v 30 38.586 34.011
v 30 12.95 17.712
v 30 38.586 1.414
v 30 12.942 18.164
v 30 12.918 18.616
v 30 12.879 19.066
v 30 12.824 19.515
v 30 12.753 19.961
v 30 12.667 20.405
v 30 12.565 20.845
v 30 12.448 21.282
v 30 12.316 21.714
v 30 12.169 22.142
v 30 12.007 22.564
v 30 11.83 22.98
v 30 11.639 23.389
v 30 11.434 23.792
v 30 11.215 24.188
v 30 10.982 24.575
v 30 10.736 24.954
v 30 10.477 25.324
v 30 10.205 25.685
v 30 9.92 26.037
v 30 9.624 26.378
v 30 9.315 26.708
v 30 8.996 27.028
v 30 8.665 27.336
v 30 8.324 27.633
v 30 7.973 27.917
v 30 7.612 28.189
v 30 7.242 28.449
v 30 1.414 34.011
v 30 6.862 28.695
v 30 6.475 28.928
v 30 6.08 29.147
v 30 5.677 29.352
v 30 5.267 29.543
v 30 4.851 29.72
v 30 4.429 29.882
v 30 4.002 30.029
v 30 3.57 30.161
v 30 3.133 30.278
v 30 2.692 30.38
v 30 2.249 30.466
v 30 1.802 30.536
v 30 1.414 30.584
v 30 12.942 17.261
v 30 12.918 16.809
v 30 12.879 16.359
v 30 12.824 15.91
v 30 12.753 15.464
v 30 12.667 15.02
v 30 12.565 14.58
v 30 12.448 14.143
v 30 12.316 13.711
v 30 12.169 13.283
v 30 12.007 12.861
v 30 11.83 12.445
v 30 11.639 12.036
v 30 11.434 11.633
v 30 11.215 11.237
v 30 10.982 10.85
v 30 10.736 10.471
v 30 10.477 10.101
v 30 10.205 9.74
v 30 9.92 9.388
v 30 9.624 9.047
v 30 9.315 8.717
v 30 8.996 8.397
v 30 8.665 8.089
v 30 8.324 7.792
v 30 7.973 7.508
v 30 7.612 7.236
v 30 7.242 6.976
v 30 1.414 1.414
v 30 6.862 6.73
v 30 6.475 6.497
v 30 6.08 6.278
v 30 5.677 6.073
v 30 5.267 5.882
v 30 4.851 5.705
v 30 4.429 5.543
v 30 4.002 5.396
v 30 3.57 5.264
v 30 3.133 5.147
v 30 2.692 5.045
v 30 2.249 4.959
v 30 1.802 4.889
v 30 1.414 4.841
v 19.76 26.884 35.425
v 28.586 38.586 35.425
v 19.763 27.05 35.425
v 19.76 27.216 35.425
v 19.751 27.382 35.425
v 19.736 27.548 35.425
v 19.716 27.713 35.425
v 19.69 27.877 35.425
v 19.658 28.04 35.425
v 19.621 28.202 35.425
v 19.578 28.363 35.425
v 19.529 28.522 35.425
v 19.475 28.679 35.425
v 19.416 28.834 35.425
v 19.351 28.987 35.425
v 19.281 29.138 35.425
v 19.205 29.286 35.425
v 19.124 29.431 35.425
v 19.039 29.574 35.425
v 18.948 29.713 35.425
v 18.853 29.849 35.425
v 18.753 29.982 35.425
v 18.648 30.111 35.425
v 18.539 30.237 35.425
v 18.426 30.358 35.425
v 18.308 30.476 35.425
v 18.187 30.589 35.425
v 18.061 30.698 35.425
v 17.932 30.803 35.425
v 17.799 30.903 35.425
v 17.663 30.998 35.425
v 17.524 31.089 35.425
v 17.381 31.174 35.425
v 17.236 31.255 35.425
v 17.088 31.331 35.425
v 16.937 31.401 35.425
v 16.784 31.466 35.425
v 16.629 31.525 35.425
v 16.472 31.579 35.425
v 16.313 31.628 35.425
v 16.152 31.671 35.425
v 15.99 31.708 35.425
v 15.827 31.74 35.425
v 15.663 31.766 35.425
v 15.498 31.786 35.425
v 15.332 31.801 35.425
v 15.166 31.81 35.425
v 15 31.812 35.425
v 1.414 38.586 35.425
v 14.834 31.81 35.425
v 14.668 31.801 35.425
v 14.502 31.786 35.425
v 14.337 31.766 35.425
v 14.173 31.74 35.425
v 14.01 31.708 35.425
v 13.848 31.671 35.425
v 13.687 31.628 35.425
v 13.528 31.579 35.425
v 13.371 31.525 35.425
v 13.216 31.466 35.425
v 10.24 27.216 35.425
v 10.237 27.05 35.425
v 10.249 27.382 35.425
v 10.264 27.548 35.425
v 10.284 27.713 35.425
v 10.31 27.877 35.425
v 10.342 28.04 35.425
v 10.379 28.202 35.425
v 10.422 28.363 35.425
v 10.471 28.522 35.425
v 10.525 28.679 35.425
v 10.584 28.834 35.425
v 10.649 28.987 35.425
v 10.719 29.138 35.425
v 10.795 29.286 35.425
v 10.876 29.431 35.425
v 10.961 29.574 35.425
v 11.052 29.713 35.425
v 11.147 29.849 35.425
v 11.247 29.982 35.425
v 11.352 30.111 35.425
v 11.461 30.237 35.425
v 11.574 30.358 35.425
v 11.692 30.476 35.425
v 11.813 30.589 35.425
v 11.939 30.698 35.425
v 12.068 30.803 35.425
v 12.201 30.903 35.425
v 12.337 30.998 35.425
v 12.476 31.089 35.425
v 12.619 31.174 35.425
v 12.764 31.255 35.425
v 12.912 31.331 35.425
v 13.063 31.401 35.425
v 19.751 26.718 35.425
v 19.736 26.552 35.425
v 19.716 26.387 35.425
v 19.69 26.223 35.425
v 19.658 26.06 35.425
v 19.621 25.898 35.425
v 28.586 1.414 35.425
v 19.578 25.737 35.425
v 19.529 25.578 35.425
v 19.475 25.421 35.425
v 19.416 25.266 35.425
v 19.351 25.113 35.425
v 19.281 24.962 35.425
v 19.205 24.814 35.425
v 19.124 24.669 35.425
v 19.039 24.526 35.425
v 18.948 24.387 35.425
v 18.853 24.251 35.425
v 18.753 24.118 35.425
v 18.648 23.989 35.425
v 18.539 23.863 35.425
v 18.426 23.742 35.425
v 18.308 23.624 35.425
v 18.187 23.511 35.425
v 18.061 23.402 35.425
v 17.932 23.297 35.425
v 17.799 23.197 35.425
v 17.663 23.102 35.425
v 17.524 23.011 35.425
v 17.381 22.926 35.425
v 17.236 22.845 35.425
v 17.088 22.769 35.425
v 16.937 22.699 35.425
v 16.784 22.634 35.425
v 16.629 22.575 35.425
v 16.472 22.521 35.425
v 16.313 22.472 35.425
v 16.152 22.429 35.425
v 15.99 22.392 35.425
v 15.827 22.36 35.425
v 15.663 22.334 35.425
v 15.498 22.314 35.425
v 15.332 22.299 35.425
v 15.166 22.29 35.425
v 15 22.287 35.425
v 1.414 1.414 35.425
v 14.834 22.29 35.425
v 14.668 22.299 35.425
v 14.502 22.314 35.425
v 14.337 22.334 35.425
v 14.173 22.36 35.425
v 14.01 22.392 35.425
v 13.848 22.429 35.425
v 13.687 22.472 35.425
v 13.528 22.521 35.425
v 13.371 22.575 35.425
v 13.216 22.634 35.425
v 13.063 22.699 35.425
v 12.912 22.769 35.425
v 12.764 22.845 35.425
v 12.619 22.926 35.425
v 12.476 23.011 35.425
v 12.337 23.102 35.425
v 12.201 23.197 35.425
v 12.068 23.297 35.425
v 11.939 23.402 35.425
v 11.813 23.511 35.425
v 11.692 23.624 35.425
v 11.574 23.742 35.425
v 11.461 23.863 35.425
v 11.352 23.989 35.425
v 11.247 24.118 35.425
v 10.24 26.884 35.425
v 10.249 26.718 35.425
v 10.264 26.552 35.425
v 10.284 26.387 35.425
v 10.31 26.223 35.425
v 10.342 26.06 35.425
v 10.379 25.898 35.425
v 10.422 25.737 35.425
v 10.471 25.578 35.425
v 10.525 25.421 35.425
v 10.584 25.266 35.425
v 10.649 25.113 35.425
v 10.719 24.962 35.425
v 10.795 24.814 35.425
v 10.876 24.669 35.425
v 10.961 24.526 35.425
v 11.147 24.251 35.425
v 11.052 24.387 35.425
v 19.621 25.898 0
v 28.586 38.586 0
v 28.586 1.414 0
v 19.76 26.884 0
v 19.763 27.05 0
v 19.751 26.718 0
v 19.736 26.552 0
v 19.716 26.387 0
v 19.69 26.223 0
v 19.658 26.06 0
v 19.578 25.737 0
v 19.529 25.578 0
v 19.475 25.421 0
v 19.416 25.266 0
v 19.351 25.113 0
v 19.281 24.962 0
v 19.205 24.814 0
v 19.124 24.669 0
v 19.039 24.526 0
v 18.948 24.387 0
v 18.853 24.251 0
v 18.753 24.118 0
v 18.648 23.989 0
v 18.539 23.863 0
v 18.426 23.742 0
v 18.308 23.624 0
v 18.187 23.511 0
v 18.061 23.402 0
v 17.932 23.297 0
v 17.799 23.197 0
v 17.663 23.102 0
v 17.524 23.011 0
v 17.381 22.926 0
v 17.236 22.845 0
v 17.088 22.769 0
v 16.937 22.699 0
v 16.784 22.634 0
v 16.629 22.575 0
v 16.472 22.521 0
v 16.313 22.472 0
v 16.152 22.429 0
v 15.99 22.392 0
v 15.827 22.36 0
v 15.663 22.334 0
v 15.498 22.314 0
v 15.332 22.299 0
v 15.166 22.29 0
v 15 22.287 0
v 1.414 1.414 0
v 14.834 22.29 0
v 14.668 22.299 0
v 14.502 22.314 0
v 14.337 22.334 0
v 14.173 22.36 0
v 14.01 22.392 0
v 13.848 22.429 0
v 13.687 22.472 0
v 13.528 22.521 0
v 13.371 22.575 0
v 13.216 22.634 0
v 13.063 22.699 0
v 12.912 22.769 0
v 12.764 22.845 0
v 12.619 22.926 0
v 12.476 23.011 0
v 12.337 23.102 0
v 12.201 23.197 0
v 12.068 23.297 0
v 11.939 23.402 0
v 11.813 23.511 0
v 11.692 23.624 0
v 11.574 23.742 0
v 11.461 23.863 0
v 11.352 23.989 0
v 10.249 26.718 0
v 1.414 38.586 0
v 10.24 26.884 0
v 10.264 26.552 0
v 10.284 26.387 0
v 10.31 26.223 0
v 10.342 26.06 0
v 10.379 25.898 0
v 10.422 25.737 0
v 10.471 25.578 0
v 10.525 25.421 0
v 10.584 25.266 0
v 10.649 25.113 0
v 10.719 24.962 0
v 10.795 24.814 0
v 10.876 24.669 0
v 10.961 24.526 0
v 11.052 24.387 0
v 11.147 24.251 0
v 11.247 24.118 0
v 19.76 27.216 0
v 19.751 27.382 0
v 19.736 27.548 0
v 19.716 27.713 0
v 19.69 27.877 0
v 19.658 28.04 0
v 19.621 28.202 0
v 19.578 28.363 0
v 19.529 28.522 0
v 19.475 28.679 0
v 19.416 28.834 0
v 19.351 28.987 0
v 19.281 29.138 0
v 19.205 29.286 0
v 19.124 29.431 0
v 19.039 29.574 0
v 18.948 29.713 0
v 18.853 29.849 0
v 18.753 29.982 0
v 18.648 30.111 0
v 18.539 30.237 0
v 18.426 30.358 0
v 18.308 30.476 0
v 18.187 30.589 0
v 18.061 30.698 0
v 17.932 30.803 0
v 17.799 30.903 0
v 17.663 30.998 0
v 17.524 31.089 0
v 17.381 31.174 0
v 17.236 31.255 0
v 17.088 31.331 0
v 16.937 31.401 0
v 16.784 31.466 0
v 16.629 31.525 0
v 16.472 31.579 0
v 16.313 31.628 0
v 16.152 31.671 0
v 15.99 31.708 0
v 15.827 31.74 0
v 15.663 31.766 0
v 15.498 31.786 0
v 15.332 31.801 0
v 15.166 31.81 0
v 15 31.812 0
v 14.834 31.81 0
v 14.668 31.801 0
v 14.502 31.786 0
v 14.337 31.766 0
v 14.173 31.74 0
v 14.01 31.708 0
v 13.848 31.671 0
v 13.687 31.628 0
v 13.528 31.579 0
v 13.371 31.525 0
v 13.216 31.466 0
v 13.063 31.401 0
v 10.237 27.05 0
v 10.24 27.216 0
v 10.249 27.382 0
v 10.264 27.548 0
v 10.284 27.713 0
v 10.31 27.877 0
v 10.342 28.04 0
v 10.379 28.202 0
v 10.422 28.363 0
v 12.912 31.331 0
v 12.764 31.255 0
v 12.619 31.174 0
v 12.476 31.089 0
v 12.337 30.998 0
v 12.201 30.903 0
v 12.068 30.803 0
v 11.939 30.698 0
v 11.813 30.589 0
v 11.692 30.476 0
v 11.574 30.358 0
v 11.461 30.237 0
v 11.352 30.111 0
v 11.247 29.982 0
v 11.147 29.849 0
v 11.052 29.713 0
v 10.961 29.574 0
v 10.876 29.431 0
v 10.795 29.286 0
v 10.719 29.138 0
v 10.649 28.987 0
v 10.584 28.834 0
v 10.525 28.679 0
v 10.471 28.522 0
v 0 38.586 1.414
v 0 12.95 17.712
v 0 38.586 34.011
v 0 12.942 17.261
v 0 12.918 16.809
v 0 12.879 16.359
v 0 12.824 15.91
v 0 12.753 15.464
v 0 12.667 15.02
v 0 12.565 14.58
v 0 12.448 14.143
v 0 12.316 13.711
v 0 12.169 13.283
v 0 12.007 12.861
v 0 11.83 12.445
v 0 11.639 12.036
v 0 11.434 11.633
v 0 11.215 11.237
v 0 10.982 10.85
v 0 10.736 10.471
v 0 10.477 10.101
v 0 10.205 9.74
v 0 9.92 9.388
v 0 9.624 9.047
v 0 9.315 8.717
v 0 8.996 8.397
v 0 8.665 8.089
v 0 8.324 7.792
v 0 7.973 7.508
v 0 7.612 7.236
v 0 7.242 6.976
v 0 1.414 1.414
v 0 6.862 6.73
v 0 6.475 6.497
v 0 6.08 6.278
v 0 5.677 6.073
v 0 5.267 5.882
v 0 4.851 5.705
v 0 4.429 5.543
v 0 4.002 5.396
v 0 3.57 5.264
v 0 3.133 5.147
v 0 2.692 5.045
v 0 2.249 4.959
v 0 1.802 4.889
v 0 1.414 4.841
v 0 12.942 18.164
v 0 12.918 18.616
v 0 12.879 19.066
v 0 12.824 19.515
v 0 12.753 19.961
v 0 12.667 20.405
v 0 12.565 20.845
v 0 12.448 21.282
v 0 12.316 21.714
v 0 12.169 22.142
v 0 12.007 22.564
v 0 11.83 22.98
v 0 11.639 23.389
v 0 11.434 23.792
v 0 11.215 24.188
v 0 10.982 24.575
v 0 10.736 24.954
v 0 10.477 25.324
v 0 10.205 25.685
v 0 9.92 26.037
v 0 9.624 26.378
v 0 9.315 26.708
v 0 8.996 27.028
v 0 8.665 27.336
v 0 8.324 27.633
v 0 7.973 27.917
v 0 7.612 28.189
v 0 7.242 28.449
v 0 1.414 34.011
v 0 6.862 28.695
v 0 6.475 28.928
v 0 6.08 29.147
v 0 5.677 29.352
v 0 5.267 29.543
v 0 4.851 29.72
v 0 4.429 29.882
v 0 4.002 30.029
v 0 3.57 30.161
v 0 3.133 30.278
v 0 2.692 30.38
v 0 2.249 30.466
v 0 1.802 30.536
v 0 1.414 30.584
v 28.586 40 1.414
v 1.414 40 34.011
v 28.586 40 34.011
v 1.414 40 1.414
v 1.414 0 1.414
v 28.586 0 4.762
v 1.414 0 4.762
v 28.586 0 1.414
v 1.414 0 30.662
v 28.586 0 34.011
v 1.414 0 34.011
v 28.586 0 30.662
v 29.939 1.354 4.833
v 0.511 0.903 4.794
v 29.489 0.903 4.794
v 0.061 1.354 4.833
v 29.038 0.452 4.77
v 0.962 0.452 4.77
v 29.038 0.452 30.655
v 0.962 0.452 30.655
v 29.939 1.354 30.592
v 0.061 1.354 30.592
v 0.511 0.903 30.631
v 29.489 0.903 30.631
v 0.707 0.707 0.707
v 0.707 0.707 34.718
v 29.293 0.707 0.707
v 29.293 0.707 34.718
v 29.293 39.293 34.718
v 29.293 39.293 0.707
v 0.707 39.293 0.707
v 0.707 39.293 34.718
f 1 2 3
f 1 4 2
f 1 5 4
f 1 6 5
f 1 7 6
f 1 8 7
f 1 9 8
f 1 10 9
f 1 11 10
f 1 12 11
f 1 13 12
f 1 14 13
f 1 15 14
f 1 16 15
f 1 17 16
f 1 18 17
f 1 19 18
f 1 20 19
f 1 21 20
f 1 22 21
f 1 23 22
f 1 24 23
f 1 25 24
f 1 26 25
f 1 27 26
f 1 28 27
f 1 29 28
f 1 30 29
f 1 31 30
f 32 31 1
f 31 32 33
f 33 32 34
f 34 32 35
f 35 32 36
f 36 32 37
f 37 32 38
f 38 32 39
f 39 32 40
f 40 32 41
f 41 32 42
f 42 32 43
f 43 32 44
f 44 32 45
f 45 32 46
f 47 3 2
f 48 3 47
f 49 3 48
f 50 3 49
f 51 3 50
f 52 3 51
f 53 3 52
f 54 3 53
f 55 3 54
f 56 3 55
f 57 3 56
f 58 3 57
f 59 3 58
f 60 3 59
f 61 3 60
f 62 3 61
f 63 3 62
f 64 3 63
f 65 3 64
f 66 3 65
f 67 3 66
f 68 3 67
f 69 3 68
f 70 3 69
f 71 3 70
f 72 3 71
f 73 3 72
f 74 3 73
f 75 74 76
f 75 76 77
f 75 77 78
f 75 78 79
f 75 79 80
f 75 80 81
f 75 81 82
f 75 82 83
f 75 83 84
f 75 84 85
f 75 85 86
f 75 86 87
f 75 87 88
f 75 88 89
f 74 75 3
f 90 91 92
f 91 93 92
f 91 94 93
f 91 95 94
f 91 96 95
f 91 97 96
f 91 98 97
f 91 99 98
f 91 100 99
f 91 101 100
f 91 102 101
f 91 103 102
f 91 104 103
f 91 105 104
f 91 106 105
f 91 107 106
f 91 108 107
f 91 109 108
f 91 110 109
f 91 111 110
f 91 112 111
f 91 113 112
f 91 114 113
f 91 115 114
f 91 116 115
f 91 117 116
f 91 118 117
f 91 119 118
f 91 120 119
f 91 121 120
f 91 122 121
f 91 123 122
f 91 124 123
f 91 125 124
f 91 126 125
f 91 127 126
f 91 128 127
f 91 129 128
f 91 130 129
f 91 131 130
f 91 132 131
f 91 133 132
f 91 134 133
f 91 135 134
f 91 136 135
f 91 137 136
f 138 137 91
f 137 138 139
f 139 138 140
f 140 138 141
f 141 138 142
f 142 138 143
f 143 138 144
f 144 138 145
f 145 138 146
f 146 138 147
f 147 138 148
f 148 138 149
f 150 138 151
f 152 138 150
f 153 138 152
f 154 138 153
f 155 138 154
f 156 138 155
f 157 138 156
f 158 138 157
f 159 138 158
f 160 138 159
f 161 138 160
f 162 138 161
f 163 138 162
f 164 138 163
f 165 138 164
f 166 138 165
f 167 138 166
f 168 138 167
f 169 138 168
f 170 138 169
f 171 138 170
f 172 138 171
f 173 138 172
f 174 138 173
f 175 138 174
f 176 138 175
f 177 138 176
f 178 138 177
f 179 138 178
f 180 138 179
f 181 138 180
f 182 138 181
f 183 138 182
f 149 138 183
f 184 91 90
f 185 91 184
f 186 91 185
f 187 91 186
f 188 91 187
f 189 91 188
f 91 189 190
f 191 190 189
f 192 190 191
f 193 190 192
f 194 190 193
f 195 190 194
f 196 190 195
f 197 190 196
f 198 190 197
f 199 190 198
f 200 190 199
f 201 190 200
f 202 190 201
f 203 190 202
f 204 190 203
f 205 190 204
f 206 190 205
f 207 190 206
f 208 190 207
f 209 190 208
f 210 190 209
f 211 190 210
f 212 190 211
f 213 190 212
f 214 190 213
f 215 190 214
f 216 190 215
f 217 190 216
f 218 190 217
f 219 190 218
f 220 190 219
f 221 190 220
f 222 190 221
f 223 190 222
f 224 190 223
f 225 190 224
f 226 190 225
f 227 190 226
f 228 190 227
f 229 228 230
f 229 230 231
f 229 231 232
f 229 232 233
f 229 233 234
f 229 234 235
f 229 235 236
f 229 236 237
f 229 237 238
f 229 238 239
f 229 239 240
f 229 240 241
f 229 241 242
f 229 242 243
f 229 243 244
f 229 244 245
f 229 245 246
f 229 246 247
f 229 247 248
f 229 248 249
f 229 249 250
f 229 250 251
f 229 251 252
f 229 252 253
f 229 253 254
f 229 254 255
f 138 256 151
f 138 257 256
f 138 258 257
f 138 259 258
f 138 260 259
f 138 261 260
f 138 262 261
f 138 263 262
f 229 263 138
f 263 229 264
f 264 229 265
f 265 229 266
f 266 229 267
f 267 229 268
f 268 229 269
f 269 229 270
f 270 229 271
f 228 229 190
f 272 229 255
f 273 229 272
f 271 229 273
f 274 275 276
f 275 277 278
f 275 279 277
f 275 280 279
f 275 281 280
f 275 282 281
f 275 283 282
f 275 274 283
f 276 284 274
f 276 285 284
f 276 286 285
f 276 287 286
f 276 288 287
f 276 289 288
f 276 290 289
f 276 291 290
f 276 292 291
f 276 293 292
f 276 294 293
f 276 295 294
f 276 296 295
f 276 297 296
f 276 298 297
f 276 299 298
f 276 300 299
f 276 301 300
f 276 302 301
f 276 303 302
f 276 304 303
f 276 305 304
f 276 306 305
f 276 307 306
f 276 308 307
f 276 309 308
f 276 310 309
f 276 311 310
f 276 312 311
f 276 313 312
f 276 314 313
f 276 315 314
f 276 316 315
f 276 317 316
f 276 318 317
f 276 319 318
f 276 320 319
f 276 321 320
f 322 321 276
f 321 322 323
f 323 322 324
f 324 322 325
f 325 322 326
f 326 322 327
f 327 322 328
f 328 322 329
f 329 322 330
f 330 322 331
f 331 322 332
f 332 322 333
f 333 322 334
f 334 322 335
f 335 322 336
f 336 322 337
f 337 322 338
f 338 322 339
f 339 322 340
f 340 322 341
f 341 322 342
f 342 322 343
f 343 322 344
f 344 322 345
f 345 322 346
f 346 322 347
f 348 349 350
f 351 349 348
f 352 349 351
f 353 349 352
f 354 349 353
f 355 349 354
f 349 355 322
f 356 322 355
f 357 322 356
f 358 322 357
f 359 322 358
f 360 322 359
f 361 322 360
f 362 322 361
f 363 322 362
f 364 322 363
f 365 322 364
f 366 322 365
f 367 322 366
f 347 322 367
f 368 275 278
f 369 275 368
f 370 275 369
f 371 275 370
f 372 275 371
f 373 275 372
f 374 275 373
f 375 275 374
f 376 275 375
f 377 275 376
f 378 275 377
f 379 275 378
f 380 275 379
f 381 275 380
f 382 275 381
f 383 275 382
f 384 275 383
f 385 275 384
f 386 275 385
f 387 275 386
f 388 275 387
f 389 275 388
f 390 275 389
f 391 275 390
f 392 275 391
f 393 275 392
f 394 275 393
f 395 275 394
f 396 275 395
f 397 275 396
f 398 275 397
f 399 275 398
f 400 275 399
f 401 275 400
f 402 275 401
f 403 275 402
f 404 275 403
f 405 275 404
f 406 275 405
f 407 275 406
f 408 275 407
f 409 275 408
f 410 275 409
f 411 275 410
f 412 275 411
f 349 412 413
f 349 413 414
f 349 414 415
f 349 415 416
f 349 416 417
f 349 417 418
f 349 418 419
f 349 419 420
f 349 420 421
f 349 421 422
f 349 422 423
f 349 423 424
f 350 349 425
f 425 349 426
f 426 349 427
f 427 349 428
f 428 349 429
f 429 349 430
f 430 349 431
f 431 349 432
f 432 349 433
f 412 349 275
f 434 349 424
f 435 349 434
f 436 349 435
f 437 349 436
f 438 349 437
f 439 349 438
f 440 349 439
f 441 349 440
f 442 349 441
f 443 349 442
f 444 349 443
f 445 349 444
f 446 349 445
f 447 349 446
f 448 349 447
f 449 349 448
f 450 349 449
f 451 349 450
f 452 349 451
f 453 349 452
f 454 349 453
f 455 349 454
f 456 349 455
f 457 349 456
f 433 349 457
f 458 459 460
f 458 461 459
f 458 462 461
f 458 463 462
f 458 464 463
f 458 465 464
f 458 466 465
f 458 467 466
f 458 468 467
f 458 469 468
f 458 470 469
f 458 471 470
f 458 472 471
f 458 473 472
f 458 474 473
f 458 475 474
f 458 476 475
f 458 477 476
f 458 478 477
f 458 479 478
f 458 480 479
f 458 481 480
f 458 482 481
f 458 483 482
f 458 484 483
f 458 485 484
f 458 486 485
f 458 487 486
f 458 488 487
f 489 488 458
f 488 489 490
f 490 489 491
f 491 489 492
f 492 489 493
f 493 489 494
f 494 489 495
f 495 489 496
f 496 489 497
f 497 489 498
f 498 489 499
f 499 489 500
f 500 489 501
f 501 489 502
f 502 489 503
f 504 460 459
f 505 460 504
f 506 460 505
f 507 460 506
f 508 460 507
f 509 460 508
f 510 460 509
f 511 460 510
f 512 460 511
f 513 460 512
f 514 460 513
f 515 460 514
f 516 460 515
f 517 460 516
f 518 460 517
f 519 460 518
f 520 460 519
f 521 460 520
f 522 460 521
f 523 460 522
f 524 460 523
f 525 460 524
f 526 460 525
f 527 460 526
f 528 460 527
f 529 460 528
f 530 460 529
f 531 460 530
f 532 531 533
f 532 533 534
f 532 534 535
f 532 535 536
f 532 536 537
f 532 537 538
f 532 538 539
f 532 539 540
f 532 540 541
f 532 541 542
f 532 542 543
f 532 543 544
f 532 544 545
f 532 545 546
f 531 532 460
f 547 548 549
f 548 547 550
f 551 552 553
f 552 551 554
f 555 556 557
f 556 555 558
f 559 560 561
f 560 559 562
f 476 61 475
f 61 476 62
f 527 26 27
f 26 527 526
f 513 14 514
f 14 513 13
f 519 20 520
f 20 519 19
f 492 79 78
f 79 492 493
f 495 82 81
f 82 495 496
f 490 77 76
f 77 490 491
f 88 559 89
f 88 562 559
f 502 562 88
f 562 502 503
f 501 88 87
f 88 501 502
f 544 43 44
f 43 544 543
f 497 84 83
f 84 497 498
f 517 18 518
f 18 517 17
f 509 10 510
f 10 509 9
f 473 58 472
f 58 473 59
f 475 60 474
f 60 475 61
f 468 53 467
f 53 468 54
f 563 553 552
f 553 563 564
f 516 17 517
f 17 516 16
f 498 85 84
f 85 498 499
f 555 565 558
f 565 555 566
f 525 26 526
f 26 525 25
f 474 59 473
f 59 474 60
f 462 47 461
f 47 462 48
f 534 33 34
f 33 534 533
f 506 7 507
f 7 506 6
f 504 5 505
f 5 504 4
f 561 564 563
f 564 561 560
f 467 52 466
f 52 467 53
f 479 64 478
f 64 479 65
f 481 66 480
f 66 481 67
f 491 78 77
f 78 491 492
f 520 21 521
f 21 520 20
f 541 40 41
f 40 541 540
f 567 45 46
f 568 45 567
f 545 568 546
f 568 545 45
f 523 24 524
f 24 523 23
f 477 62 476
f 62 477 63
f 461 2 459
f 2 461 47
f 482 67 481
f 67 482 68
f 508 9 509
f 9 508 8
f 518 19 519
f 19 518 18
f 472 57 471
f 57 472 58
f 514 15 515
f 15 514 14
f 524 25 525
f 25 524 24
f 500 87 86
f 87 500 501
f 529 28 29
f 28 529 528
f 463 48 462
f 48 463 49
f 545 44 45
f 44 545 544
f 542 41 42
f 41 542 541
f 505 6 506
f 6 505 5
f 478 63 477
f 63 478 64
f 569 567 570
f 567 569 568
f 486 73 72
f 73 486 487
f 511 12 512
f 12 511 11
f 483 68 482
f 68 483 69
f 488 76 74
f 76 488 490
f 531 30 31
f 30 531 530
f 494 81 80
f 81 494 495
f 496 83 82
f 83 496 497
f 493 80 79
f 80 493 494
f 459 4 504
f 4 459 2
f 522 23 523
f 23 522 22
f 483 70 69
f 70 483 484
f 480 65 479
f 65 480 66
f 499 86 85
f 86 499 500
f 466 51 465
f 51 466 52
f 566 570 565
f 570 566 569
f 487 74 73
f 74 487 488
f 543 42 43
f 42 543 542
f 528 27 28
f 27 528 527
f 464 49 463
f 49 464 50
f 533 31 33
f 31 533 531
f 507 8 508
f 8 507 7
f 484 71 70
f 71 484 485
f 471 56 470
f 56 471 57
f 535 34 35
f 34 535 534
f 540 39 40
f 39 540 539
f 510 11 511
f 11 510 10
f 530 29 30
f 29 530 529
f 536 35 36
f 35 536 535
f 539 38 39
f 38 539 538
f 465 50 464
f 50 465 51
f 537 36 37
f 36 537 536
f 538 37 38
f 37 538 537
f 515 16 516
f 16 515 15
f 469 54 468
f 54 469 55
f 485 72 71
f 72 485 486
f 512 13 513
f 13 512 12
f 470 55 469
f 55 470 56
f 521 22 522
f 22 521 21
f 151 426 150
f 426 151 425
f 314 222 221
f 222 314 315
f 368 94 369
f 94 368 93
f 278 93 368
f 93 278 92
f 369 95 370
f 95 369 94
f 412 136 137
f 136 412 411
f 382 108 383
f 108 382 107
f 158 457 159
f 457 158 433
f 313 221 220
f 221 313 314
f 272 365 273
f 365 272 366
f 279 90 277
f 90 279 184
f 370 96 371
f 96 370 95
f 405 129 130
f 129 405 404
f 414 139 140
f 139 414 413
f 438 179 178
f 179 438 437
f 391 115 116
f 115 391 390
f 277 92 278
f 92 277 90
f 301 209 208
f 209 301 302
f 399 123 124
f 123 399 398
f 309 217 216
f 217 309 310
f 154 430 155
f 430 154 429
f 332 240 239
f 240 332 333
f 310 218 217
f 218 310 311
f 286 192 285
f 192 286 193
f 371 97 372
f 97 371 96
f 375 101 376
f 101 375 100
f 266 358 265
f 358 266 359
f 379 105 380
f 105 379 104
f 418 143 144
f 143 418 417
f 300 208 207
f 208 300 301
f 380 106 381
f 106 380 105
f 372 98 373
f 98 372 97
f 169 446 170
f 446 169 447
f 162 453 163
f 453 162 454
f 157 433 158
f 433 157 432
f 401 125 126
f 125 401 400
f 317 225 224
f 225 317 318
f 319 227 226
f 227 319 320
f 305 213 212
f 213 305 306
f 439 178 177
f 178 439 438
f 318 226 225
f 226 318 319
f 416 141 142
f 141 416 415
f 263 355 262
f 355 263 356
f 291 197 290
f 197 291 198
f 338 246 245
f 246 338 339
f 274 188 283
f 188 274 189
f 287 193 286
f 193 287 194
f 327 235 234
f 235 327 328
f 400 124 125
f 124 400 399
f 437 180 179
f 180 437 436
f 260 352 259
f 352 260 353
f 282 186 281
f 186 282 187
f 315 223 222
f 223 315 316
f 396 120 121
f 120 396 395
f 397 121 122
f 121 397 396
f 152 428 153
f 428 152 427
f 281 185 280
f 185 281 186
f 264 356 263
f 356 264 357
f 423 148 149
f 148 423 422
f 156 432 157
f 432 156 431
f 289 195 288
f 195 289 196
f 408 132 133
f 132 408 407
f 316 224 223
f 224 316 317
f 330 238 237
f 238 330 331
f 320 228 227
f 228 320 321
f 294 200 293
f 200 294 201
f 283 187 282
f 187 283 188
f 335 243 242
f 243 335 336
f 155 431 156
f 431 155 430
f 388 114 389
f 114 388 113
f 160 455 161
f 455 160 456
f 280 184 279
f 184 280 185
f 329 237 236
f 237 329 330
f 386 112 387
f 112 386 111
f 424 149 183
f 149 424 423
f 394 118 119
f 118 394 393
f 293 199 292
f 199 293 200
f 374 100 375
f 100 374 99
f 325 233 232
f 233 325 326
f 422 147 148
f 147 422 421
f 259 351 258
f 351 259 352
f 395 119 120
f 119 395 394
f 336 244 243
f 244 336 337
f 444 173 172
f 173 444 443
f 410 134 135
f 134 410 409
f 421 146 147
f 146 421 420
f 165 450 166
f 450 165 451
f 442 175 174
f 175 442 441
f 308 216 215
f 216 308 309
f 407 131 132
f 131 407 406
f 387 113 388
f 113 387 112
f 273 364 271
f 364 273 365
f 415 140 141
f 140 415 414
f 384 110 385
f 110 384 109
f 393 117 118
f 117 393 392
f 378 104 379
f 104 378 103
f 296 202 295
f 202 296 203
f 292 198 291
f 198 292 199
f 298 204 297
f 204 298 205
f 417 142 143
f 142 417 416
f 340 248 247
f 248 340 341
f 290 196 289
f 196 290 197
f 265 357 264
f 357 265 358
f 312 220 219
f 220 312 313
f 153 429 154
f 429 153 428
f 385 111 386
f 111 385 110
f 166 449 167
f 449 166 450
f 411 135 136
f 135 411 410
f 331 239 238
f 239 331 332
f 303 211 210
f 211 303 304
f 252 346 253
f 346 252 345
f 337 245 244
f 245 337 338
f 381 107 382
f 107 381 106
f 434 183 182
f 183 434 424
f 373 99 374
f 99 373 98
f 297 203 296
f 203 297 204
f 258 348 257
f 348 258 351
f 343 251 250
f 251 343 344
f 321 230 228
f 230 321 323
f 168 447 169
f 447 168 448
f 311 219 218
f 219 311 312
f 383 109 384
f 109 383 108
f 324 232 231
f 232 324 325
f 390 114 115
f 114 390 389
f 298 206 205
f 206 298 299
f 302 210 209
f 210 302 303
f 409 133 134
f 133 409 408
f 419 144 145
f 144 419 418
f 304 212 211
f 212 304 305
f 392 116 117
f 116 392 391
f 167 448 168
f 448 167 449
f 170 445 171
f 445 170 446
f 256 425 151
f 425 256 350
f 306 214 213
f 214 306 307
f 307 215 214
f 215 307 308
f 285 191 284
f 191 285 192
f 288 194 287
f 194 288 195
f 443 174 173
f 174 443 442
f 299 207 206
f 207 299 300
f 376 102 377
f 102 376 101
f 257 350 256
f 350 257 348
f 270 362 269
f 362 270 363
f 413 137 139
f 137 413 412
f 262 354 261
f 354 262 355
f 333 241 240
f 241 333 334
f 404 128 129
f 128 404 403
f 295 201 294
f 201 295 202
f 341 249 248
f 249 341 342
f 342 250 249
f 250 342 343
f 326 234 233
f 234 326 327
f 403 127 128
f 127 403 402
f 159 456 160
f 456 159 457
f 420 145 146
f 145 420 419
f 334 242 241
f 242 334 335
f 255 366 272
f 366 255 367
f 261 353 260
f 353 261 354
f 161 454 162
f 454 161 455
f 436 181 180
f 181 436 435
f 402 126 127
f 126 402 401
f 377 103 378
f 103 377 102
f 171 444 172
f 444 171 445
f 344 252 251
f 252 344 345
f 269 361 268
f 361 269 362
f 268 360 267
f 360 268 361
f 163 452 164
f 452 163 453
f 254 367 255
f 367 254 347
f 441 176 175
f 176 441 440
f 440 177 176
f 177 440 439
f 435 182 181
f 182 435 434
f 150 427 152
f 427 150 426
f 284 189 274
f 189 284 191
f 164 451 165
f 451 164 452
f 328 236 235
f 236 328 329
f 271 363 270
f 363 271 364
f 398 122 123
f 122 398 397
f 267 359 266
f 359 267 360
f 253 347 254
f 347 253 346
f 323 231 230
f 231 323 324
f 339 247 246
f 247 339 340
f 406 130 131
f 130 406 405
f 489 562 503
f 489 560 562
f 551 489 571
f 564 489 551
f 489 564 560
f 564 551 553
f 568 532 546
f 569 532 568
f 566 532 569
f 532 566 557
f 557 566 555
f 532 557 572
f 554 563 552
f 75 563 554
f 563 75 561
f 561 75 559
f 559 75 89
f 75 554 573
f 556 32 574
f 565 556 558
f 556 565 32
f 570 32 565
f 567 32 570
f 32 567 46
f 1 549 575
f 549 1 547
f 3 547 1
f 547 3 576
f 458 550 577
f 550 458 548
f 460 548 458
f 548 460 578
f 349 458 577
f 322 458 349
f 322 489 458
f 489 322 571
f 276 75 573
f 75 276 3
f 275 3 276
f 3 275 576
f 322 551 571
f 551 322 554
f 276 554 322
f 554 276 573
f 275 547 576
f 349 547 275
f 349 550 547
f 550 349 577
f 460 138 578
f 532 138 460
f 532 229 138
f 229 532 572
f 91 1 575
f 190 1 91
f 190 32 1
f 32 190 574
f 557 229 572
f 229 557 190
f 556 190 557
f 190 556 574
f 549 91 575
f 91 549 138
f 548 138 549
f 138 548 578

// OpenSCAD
$fn          = 180;     // Number of fragments
pipe_od      = 25.9;    // OD of MaxLine (1" + 0.02" printing fudge factor)
lip          =  4.7625; // Extra lip on either side is 3/16"
block_x      = 30;      // Block width
block_y      = 40;      // Block depth
axle         =  9.525;  // 3/8" screw for axle
chamfer      =  2;      // Edge chamfer in mm

block_height = pipe_od + (lip * 2);

function hypotenuse (a, b) = sqrt ((a * a) + (b * b));

module block () {
  difference () {
    cube ([block_x, block_y, block_height]);
    translate ([-0.01, 0, block_height / 2])
      rotate ([0, 90, 0])
        cylinder (d = pipe_od, h = block_x + (0.01 * 2));
    translate ([block_x / 2, (block_y - (pipe_od / 2)), -0.01])
      cylinder (d = axle, h = block_height + (0.01 * 2));
  }
}

module vertical_chamfer () {
  x = [[0, -(hypotenuse (chamfer, chamfer) / 2)],
       [block_x + (hypotenuse (chamfer, chamfer) / 2), 0],
       [block_x, block_y + (hypotenuse (chamfer, chamfer) / 2)],
       [-(hypotenuse (chamfer, chamfer) / 2), block_y]
      ];

  for (i = [0:3])
    translate ([x [i][0], x [i][1], -0.01])
      rotate ([0, 0, (i * 90) + 45])
        cube ([chamfer, chamfer, block_height + 0.02]);
}

module horizontal_chamfer (z) {
  x = [[[0, -0.01, z + (hypotenuse (chamfer, chamfer) / 2)], [270, 0, 0], block_y],
       [[block_x, -0.01, z + (hypotenuse (chamfer, chamfer) / 2)], [270, 0, 0], block_y],
       [[block_x + 0.01, -(hypotenuse (chamfer, chamfer) / 2), z], [0, 270, 0], block_x],
       [[block_x + 0.01, block_y - (hypotenuse (chamfer, chamfer) / 2), z], [0, 270, 0], block_x]
      ];

  for (i = [0:3])
    translate (x [i][0])
      rotate (x [i][1])
        rotate ([0, 0, 45])
          cube ([chamfer, chamfer, x[i][2] + 0.02]);
}

module chamfer () {
  vertical_chamfer ();
  horizontal_chamfer (0);
  horizontal_chamfer (block_height);
}

difference () {
  block ();
  chamfer ();
}
